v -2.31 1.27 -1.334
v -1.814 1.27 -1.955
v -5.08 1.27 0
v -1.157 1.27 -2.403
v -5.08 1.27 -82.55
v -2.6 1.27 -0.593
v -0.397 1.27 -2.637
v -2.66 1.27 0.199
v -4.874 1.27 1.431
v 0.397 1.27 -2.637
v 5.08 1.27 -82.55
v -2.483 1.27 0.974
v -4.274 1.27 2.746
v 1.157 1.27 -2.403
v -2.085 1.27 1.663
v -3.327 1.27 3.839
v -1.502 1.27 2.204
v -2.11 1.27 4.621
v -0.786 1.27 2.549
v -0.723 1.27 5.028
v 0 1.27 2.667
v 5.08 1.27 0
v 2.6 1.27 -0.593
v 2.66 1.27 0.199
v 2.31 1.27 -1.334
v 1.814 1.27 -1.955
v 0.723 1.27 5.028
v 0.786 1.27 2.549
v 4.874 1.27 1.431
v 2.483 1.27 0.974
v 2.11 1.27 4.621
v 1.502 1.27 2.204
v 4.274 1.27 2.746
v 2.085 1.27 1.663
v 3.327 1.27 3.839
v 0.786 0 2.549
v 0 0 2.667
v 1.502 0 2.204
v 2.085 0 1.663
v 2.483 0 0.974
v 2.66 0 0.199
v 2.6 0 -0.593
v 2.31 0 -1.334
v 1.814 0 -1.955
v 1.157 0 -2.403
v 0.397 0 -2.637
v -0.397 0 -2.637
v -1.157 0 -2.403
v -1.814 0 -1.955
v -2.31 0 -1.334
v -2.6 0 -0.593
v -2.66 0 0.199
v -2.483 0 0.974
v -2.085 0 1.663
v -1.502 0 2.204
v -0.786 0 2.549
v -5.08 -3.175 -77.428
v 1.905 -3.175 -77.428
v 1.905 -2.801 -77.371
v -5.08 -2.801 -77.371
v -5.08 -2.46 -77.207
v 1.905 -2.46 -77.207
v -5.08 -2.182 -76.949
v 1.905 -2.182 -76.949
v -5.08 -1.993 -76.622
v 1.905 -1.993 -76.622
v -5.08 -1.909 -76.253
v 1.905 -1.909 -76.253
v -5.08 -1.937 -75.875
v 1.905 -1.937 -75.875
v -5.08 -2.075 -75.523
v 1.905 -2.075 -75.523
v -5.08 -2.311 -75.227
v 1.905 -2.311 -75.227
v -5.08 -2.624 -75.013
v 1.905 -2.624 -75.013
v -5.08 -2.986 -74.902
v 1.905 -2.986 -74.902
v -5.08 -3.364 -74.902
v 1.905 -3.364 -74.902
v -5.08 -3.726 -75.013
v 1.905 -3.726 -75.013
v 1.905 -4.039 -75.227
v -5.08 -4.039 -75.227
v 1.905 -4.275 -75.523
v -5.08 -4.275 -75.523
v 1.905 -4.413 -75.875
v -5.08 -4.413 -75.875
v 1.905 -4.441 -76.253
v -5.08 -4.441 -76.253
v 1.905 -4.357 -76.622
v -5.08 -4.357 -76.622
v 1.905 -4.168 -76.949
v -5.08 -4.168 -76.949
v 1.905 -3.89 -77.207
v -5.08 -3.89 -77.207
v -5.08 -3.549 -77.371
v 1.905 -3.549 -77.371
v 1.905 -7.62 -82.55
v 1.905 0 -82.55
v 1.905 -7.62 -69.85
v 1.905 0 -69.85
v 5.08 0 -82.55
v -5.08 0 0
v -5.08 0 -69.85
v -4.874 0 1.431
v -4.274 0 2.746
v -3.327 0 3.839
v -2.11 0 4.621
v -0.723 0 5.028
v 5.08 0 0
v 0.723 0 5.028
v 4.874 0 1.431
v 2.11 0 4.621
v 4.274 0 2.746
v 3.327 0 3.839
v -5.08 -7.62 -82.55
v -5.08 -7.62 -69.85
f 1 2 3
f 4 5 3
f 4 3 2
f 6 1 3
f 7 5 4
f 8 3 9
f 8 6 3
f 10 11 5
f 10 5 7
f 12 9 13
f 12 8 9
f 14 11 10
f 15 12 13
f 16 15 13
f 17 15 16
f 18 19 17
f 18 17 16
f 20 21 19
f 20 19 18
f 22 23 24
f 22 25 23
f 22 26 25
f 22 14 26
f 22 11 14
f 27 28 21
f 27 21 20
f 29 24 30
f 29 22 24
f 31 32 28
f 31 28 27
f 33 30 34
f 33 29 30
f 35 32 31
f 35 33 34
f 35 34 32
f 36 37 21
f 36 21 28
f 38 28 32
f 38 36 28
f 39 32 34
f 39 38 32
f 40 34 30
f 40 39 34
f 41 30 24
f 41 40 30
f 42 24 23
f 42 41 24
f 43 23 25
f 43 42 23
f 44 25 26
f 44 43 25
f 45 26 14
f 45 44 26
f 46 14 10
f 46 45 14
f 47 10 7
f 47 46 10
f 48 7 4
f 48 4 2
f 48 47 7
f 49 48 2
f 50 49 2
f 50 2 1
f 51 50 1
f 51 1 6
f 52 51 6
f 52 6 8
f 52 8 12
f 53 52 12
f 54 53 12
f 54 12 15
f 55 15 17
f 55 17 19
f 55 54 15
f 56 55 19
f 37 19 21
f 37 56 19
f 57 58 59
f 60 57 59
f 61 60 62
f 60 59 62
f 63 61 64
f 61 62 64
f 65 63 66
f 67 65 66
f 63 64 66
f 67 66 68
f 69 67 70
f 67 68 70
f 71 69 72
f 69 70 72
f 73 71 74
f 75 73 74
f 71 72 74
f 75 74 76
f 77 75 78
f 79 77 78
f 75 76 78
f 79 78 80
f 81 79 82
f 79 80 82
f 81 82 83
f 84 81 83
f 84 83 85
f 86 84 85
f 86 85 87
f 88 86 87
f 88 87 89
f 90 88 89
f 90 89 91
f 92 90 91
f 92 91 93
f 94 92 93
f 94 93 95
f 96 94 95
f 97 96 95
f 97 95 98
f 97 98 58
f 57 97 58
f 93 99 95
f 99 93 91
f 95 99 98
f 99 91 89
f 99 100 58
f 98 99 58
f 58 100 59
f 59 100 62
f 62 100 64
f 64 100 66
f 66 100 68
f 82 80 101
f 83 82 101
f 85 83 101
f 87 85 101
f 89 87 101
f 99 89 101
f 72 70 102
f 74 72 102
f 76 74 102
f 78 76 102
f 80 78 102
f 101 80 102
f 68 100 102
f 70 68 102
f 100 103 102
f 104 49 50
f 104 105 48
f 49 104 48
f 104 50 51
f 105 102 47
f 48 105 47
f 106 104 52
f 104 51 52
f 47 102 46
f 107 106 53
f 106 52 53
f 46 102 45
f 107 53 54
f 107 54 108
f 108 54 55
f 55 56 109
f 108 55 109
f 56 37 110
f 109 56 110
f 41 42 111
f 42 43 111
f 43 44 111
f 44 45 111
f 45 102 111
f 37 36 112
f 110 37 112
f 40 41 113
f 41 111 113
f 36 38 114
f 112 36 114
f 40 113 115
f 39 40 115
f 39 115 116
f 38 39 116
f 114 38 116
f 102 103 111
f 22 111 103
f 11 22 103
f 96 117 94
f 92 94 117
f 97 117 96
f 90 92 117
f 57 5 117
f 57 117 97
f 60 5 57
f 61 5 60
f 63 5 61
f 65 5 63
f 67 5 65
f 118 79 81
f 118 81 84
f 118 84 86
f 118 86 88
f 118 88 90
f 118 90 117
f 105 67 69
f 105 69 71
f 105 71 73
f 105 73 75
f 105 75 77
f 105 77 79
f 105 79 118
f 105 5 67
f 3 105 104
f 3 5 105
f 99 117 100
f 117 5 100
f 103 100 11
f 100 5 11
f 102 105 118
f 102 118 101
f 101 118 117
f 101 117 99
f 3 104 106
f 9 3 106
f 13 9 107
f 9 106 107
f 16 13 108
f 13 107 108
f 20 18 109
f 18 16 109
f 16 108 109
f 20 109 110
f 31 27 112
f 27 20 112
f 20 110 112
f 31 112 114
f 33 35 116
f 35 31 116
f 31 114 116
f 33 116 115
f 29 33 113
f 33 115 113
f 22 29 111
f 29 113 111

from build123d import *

# Parameters (mm, degrees)
SKETCH1_R           = 5.08
SKETCH1_R_2         = 2.667
BOSS_EXTRUDE1_DEPTH = 1.27
BOSS_EXTRUDE5_DEPTH = 1.27
SKETCH6_W           = 6.985
SKETCH6_H           = 12.7
BOSS_EXTRUDE6_DEPTH = 7.62
CUT_EXTRUDE2_REACH  = 85.195
SKETCH7_R           = 1.27


with BuildPart() as part:
    # Sketch1 → Boss-Extrude1 (new body)
    with BuildSketch(Plane(origin=(0, 0, 0), x_dir=(1, 0, 0), z_dir=(0, 1, 0))):
        with Locations(Location((0, 0, 0), (0, 0, 270))):
            Circle(SKETCH1_R)
        with Locations(Location((0, 0, 0), (0, 0, 270))):
            Circle(SKETCH1_R_2, mode=Mode.SUBTRACT)
    extrude(amount=BOSS_EXTRUDE1_DEPTH)

    # Sketch5 → Boss-Extrude5 (add)
    with BuildSketch(Plane(origin=(0, 0, 0), x_dir=(-1, 0, 0), z_dir=(0, -1, 0))):
        with BuildLine():
            Line((-5.08, 0), (-5.08, 82.55))
            Line((-5.08, 82.55), (5.08, 82.55))
            Line((5.08, 82.55), (5.08, 0))
            ThreePointArc((5.08, 0), (0, 5.08), (-5.08, 0))
        make_face()
    extrude(amount=-BOSS_EXTRUDE5_DEPTH)

    # Sketch6 → Boss-Extrude6 (add)
    with BuildSketch(Plane.XZ):
        with Locations((-1.5875, -76.2)):
            Rectangle(SKETCH6_W, SKETCH6_H)
    extrude(amount=BOSS_EXTRUDE6_DEPTH)

    # Sketch7 → Cut-Extrude2 (cut, up to next)
    with BuildSketch(Plane(origin=(1.905, 0, 0), x_dir=(0, 0, -1), z_dir=(1, 0, 0)), mode=Mode.PRIVATE) as cut_extrude2_sk1:
        with Locations((76.157654901, -3.175)):
            Circle(SKETCH7_R)
    cut_extrude2_tool1 = extrude(cut_extrude2_sk1.sketch, amount=-CUT_EXTRUDE2_REACH, mode=Mode.PRIVATE) & part.part
    add(cut_extrude2_tool1.solids().sort_by_distance((1.905, -3.175, -76.157655))[0], mode=Mode.SUBTRACT)


solid = part.part
